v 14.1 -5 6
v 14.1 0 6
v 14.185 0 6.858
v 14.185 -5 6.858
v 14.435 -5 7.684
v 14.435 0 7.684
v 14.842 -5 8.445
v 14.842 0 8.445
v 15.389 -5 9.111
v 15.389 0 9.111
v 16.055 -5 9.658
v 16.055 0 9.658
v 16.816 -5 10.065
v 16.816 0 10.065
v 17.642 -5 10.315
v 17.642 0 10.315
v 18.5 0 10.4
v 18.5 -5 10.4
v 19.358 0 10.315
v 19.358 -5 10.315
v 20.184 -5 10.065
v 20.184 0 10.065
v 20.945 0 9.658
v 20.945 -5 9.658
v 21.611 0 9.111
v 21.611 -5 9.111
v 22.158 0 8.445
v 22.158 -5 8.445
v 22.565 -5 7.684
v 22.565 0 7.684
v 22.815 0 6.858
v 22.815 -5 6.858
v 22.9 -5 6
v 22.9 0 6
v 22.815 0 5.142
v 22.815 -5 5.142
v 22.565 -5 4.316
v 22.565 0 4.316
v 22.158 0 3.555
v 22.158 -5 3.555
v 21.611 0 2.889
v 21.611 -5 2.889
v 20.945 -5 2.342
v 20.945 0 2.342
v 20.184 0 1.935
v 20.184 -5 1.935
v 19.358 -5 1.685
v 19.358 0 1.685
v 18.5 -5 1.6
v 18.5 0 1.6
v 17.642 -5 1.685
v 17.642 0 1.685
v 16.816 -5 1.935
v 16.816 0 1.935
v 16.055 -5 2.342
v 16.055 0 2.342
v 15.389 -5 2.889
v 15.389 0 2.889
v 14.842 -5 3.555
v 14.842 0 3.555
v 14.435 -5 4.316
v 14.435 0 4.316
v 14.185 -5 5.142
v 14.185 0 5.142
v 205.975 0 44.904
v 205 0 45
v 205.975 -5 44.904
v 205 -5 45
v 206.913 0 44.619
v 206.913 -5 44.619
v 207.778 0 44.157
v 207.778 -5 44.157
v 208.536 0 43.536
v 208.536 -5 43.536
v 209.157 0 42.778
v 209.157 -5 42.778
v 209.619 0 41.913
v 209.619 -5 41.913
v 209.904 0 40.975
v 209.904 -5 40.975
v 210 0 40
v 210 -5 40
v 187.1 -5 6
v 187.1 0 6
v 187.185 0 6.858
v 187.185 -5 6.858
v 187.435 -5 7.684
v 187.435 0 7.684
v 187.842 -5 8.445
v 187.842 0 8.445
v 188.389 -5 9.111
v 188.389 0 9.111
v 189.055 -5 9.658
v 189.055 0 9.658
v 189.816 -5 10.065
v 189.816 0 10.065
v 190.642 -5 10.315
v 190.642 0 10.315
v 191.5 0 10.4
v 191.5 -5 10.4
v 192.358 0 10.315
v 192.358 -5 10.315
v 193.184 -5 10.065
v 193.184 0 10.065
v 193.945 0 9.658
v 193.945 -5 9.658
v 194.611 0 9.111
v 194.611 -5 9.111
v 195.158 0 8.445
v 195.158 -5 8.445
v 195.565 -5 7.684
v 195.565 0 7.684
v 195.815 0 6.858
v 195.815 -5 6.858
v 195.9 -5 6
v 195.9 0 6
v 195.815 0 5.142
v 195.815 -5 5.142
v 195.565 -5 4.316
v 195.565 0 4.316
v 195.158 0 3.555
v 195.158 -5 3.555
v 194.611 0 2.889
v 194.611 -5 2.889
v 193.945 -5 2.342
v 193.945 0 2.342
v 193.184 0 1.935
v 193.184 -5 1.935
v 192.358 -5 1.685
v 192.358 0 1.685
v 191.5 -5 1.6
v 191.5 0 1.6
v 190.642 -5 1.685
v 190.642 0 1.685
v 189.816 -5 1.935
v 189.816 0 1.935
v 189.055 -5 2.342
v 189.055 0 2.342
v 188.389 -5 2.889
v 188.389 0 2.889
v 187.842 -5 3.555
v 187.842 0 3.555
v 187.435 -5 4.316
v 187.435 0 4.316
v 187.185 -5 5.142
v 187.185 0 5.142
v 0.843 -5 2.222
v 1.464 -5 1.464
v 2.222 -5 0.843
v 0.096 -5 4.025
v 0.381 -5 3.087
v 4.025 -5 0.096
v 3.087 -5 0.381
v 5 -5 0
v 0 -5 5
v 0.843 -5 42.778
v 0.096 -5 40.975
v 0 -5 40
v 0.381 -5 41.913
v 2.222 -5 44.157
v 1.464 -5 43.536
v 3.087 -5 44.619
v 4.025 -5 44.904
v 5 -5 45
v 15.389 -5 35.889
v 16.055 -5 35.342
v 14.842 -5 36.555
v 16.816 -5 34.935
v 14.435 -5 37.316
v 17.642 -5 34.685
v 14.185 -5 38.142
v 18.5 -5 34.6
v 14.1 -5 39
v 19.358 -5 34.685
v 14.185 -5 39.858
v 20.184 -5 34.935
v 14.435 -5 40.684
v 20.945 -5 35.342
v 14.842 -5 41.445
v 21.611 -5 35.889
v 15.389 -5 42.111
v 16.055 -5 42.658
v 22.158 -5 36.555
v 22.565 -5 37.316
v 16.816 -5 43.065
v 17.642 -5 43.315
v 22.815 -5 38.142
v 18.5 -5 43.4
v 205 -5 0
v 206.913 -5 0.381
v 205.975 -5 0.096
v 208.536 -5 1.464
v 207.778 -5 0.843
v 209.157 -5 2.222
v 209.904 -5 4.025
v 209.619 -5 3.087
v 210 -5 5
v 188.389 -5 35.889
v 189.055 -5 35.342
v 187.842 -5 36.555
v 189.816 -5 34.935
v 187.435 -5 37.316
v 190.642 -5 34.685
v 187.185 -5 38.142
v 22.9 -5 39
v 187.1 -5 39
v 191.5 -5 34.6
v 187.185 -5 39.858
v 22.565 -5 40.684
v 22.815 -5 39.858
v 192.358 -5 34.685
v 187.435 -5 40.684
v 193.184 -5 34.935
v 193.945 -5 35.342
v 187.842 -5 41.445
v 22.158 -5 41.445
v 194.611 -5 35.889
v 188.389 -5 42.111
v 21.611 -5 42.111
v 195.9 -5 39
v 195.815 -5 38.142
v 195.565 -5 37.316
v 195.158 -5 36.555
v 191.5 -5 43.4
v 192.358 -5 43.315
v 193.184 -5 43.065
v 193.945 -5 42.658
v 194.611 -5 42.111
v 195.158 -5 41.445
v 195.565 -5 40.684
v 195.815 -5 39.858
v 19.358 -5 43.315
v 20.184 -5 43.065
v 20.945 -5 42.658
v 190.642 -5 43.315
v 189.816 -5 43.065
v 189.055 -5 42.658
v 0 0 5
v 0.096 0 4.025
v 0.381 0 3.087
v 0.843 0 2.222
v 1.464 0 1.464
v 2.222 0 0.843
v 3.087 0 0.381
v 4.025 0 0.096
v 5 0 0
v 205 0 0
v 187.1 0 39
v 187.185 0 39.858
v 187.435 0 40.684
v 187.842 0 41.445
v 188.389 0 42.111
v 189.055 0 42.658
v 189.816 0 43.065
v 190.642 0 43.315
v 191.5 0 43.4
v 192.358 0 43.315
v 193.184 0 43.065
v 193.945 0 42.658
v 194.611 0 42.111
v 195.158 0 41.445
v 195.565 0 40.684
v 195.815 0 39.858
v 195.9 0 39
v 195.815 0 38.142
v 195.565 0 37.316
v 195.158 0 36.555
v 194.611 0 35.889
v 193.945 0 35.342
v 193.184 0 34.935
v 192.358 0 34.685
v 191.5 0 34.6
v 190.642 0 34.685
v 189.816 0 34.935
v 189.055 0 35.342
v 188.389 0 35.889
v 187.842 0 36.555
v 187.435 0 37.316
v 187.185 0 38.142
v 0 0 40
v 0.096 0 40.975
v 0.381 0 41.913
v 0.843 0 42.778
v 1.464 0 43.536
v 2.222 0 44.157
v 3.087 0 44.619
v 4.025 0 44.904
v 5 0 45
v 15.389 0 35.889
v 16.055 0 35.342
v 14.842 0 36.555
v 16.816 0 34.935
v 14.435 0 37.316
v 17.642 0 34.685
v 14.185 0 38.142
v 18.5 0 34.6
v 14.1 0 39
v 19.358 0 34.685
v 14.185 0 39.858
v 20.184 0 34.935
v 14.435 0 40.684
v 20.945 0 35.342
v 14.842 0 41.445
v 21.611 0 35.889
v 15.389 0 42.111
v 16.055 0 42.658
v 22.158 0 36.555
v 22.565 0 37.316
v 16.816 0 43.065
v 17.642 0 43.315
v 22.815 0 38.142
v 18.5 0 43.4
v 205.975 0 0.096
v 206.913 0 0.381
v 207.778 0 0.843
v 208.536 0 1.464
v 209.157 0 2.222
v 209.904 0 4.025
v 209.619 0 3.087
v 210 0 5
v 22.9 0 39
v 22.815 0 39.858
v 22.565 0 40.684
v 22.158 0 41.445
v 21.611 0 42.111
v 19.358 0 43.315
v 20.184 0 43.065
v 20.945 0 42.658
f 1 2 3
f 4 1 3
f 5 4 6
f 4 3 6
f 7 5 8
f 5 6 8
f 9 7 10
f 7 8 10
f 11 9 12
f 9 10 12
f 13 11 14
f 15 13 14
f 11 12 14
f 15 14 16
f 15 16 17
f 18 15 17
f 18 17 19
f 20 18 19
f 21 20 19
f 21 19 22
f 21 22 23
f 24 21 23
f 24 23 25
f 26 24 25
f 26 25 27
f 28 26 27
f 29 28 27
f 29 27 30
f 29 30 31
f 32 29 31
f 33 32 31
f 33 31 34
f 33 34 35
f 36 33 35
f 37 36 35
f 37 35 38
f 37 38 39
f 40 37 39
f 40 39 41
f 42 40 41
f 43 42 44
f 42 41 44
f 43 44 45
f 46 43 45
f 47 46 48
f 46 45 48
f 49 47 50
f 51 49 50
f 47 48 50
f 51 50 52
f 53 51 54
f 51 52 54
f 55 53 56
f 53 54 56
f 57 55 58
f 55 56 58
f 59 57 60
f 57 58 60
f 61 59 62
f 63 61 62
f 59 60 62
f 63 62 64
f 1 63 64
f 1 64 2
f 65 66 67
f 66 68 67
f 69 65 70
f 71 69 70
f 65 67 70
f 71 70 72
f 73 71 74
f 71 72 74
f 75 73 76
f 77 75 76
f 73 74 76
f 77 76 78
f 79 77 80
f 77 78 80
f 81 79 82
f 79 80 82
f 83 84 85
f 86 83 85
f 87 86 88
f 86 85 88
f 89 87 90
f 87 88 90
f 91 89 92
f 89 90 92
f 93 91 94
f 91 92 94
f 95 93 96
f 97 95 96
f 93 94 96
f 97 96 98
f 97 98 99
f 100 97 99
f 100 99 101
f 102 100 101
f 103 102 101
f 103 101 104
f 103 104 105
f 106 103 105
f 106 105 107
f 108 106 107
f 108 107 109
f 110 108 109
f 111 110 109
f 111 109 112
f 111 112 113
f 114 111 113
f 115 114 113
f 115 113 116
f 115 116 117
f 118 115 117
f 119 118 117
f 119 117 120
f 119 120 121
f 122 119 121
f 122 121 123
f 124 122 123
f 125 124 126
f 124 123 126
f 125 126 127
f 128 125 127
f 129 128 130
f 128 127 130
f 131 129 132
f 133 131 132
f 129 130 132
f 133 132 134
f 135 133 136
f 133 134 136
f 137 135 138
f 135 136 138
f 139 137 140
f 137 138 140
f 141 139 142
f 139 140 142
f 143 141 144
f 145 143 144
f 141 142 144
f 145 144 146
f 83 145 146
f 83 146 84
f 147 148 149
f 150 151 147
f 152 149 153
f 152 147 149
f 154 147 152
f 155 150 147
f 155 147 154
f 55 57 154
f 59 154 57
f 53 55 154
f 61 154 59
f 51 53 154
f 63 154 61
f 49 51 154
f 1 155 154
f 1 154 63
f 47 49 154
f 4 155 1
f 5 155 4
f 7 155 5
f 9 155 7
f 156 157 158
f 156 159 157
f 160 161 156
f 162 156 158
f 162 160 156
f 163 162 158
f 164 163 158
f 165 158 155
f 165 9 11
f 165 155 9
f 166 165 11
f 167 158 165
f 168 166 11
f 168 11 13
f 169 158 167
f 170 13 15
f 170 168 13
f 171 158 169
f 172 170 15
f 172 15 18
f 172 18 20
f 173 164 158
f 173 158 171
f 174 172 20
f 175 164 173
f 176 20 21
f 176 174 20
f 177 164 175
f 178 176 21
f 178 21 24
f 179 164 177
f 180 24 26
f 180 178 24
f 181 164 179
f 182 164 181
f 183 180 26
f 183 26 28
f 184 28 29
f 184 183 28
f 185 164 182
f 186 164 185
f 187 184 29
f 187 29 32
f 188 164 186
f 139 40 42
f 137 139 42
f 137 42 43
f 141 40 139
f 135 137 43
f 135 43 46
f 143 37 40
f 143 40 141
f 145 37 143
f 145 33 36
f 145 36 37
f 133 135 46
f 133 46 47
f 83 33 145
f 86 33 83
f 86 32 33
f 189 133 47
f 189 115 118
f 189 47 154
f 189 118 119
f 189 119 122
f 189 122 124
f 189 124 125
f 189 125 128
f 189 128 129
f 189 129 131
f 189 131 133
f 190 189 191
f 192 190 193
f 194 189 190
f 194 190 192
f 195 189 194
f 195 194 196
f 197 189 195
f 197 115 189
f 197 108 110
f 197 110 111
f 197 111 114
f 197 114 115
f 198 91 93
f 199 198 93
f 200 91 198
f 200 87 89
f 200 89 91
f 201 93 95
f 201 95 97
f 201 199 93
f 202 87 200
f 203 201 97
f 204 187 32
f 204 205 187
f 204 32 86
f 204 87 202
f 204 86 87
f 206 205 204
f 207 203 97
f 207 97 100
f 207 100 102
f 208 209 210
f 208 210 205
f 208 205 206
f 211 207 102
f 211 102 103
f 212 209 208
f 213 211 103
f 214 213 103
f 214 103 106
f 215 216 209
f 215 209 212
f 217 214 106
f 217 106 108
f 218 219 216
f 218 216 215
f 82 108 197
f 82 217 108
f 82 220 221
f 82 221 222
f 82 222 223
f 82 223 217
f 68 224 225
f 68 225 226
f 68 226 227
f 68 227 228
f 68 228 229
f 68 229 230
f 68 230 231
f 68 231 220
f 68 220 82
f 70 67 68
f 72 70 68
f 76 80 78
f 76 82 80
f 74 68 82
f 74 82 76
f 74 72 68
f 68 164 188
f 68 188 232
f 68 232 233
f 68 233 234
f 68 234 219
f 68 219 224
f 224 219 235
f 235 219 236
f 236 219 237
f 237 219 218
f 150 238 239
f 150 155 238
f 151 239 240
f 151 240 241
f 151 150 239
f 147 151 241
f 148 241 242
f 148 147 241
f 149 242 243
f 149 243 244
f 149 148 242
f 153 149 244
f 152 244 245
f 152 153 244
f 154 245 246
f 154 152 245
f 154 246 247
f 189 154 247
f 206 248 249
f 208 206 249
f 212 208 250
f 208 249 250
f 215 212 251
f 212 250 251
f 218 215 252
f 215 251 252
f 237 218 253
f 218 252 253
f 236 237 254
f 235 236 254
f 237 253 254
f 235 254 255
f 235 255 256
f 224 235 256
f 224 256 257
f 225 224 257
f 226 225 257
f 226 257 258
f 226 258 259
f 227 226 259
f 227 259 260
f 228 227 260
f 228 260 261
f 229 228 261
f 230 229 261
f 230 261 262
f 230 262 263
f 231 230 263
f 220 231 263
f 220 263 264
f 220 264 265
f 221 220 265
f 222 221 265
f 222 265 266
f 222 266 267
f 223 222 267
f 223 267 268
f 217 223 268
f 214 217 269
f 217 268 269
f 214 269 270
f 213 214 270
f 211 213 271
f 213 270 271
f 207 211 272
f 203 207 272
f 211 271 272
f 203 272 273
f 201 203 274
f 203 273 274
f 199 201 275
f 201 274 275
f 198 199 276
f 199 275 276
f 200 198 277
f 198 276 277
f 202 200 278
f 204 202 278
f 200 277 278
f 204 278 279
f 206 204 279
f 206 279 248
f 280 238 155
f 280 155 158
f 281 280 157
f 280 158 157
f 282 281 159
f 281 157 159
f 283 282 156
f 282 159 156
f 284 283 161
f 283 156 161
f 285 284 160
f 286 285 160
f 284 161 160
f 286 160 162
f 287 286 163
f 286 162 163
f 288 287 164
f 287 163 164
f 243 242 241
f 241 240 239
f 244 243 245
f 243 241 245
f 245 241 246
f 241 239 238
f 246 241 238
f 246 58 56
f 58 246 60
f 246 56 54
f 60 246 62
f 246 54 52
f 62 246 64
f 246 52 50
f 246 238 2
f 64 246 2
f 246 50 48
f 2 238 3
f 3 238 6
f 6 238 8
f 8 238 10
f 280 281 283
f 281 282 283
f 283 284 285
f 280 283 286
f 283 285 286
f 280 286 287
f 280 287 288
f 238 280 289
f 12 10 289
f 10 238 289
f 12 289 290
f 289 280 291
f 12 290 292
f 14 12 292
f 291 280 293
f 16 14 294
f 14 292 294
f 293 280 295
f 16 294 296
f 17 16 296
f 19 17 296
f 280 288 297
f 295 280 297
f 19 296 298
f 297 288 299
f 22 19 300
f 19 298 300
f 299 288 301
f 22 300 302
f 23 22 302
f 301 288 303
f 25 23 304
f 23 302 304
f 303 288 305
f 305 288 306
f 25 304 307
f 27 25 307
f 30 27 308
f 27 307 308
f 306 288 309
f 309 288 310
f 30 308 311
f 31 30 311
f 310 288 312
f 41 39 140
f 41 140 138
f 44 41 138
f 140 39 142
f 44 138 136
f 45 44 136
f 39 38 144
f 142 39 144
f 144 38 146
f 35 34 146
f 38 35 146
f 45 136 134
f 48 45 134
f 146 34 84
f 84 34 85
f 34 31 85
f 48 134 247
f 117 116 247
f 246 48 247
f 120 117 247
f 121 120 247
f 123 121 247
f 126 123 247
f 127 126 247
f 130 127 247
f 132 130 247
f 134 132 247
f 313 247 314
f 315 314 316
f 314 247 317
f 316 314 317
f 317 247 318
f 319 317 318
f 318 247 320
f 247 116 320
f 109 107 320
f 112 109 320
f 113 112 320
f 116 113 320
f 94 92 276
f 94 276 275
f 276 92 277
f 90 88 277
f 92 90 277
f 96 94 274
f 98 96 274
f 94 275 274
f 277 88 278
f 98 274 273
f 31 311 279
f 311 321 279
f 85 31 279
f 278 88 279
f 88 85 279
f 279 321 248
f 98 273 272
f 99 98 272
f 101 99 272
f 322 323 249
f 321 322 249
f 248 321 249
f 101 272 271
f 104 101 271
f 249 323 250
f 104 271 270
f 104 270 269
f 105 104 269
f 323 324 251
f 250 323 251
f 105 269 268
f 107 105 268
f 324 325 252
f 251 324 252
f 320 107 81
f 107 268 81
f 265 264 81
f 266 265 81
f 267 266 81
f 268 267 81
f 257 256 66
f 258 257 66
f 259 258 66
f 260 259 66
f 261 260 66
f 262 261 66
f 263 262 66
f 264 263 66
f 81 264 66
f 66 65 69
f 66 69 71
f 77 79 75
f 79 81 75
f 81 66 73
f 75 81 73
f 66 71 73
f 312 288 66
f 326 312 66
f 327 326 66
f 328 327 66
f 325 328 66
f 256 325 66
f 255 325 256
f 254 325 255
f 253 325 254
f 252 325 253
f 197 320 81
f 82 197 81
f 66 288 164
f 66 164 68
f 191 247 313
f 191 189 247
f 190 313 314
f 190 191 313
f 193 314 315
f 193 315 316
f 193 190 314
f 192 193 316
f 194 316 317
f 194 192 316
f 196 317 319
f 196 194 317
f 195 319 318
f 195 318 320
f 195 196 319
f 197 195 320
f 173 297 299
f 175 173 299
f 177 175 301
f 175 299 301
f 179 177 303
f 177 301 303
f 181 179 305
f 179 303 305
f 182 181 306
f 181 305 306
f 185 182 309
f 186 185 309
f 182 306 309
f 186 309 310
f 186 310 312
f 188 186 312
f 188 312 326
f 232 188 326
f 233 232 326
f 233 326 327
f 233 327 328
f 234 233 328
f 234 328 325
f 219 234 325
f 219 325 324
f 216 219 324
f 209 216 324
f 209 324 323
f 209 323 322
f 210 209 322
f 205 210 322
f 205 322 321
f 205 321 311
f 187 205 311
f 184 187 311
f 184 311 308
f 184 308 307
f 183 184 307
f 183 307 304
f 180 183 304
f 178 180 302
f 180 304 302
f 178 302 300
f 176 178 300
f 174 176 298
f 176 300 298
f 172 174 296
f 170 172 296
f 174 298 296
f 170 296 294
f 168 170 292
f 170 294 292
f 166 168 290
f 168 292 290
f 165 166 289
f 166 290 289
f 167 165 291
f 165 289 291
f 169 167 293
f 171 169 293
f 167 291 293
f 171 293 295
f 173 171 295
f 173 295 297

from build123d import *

# Parameters (mm, degrees)
F0_W     = 210
F0_H     = 45
F1_DEPTH = 5
F3_D     = 8.8
F4_R     = 5


with BuildPart() as f1:
    # F0 (on Front) → F1 (new body)
    with BuildSketch(Plane.XZ):
        with Locations((105, 22.5)):
            Rectangle(F0_W, F0_H)
    extrude(amount=F1_DEPTH)

    # F3 (through all)
    with Locations(Plane.XZ.offset(5)):
        with Locations((18.5, 39), (18.5, 6), (191.5, 39), (191.5, 6)):
            Hole(F3_D / 2)

    # F4
    f4_edges = [f1.edges().sort_by_distance(p)[0] for p in [
        (0, -2.5, 45),
        (0, -2.5, 0),
        (210, -2.5, 0),
        (210, -2.5, 45),
    ]]
    fillet(f4_edges, radius=F4_R)


solid = f1.part
